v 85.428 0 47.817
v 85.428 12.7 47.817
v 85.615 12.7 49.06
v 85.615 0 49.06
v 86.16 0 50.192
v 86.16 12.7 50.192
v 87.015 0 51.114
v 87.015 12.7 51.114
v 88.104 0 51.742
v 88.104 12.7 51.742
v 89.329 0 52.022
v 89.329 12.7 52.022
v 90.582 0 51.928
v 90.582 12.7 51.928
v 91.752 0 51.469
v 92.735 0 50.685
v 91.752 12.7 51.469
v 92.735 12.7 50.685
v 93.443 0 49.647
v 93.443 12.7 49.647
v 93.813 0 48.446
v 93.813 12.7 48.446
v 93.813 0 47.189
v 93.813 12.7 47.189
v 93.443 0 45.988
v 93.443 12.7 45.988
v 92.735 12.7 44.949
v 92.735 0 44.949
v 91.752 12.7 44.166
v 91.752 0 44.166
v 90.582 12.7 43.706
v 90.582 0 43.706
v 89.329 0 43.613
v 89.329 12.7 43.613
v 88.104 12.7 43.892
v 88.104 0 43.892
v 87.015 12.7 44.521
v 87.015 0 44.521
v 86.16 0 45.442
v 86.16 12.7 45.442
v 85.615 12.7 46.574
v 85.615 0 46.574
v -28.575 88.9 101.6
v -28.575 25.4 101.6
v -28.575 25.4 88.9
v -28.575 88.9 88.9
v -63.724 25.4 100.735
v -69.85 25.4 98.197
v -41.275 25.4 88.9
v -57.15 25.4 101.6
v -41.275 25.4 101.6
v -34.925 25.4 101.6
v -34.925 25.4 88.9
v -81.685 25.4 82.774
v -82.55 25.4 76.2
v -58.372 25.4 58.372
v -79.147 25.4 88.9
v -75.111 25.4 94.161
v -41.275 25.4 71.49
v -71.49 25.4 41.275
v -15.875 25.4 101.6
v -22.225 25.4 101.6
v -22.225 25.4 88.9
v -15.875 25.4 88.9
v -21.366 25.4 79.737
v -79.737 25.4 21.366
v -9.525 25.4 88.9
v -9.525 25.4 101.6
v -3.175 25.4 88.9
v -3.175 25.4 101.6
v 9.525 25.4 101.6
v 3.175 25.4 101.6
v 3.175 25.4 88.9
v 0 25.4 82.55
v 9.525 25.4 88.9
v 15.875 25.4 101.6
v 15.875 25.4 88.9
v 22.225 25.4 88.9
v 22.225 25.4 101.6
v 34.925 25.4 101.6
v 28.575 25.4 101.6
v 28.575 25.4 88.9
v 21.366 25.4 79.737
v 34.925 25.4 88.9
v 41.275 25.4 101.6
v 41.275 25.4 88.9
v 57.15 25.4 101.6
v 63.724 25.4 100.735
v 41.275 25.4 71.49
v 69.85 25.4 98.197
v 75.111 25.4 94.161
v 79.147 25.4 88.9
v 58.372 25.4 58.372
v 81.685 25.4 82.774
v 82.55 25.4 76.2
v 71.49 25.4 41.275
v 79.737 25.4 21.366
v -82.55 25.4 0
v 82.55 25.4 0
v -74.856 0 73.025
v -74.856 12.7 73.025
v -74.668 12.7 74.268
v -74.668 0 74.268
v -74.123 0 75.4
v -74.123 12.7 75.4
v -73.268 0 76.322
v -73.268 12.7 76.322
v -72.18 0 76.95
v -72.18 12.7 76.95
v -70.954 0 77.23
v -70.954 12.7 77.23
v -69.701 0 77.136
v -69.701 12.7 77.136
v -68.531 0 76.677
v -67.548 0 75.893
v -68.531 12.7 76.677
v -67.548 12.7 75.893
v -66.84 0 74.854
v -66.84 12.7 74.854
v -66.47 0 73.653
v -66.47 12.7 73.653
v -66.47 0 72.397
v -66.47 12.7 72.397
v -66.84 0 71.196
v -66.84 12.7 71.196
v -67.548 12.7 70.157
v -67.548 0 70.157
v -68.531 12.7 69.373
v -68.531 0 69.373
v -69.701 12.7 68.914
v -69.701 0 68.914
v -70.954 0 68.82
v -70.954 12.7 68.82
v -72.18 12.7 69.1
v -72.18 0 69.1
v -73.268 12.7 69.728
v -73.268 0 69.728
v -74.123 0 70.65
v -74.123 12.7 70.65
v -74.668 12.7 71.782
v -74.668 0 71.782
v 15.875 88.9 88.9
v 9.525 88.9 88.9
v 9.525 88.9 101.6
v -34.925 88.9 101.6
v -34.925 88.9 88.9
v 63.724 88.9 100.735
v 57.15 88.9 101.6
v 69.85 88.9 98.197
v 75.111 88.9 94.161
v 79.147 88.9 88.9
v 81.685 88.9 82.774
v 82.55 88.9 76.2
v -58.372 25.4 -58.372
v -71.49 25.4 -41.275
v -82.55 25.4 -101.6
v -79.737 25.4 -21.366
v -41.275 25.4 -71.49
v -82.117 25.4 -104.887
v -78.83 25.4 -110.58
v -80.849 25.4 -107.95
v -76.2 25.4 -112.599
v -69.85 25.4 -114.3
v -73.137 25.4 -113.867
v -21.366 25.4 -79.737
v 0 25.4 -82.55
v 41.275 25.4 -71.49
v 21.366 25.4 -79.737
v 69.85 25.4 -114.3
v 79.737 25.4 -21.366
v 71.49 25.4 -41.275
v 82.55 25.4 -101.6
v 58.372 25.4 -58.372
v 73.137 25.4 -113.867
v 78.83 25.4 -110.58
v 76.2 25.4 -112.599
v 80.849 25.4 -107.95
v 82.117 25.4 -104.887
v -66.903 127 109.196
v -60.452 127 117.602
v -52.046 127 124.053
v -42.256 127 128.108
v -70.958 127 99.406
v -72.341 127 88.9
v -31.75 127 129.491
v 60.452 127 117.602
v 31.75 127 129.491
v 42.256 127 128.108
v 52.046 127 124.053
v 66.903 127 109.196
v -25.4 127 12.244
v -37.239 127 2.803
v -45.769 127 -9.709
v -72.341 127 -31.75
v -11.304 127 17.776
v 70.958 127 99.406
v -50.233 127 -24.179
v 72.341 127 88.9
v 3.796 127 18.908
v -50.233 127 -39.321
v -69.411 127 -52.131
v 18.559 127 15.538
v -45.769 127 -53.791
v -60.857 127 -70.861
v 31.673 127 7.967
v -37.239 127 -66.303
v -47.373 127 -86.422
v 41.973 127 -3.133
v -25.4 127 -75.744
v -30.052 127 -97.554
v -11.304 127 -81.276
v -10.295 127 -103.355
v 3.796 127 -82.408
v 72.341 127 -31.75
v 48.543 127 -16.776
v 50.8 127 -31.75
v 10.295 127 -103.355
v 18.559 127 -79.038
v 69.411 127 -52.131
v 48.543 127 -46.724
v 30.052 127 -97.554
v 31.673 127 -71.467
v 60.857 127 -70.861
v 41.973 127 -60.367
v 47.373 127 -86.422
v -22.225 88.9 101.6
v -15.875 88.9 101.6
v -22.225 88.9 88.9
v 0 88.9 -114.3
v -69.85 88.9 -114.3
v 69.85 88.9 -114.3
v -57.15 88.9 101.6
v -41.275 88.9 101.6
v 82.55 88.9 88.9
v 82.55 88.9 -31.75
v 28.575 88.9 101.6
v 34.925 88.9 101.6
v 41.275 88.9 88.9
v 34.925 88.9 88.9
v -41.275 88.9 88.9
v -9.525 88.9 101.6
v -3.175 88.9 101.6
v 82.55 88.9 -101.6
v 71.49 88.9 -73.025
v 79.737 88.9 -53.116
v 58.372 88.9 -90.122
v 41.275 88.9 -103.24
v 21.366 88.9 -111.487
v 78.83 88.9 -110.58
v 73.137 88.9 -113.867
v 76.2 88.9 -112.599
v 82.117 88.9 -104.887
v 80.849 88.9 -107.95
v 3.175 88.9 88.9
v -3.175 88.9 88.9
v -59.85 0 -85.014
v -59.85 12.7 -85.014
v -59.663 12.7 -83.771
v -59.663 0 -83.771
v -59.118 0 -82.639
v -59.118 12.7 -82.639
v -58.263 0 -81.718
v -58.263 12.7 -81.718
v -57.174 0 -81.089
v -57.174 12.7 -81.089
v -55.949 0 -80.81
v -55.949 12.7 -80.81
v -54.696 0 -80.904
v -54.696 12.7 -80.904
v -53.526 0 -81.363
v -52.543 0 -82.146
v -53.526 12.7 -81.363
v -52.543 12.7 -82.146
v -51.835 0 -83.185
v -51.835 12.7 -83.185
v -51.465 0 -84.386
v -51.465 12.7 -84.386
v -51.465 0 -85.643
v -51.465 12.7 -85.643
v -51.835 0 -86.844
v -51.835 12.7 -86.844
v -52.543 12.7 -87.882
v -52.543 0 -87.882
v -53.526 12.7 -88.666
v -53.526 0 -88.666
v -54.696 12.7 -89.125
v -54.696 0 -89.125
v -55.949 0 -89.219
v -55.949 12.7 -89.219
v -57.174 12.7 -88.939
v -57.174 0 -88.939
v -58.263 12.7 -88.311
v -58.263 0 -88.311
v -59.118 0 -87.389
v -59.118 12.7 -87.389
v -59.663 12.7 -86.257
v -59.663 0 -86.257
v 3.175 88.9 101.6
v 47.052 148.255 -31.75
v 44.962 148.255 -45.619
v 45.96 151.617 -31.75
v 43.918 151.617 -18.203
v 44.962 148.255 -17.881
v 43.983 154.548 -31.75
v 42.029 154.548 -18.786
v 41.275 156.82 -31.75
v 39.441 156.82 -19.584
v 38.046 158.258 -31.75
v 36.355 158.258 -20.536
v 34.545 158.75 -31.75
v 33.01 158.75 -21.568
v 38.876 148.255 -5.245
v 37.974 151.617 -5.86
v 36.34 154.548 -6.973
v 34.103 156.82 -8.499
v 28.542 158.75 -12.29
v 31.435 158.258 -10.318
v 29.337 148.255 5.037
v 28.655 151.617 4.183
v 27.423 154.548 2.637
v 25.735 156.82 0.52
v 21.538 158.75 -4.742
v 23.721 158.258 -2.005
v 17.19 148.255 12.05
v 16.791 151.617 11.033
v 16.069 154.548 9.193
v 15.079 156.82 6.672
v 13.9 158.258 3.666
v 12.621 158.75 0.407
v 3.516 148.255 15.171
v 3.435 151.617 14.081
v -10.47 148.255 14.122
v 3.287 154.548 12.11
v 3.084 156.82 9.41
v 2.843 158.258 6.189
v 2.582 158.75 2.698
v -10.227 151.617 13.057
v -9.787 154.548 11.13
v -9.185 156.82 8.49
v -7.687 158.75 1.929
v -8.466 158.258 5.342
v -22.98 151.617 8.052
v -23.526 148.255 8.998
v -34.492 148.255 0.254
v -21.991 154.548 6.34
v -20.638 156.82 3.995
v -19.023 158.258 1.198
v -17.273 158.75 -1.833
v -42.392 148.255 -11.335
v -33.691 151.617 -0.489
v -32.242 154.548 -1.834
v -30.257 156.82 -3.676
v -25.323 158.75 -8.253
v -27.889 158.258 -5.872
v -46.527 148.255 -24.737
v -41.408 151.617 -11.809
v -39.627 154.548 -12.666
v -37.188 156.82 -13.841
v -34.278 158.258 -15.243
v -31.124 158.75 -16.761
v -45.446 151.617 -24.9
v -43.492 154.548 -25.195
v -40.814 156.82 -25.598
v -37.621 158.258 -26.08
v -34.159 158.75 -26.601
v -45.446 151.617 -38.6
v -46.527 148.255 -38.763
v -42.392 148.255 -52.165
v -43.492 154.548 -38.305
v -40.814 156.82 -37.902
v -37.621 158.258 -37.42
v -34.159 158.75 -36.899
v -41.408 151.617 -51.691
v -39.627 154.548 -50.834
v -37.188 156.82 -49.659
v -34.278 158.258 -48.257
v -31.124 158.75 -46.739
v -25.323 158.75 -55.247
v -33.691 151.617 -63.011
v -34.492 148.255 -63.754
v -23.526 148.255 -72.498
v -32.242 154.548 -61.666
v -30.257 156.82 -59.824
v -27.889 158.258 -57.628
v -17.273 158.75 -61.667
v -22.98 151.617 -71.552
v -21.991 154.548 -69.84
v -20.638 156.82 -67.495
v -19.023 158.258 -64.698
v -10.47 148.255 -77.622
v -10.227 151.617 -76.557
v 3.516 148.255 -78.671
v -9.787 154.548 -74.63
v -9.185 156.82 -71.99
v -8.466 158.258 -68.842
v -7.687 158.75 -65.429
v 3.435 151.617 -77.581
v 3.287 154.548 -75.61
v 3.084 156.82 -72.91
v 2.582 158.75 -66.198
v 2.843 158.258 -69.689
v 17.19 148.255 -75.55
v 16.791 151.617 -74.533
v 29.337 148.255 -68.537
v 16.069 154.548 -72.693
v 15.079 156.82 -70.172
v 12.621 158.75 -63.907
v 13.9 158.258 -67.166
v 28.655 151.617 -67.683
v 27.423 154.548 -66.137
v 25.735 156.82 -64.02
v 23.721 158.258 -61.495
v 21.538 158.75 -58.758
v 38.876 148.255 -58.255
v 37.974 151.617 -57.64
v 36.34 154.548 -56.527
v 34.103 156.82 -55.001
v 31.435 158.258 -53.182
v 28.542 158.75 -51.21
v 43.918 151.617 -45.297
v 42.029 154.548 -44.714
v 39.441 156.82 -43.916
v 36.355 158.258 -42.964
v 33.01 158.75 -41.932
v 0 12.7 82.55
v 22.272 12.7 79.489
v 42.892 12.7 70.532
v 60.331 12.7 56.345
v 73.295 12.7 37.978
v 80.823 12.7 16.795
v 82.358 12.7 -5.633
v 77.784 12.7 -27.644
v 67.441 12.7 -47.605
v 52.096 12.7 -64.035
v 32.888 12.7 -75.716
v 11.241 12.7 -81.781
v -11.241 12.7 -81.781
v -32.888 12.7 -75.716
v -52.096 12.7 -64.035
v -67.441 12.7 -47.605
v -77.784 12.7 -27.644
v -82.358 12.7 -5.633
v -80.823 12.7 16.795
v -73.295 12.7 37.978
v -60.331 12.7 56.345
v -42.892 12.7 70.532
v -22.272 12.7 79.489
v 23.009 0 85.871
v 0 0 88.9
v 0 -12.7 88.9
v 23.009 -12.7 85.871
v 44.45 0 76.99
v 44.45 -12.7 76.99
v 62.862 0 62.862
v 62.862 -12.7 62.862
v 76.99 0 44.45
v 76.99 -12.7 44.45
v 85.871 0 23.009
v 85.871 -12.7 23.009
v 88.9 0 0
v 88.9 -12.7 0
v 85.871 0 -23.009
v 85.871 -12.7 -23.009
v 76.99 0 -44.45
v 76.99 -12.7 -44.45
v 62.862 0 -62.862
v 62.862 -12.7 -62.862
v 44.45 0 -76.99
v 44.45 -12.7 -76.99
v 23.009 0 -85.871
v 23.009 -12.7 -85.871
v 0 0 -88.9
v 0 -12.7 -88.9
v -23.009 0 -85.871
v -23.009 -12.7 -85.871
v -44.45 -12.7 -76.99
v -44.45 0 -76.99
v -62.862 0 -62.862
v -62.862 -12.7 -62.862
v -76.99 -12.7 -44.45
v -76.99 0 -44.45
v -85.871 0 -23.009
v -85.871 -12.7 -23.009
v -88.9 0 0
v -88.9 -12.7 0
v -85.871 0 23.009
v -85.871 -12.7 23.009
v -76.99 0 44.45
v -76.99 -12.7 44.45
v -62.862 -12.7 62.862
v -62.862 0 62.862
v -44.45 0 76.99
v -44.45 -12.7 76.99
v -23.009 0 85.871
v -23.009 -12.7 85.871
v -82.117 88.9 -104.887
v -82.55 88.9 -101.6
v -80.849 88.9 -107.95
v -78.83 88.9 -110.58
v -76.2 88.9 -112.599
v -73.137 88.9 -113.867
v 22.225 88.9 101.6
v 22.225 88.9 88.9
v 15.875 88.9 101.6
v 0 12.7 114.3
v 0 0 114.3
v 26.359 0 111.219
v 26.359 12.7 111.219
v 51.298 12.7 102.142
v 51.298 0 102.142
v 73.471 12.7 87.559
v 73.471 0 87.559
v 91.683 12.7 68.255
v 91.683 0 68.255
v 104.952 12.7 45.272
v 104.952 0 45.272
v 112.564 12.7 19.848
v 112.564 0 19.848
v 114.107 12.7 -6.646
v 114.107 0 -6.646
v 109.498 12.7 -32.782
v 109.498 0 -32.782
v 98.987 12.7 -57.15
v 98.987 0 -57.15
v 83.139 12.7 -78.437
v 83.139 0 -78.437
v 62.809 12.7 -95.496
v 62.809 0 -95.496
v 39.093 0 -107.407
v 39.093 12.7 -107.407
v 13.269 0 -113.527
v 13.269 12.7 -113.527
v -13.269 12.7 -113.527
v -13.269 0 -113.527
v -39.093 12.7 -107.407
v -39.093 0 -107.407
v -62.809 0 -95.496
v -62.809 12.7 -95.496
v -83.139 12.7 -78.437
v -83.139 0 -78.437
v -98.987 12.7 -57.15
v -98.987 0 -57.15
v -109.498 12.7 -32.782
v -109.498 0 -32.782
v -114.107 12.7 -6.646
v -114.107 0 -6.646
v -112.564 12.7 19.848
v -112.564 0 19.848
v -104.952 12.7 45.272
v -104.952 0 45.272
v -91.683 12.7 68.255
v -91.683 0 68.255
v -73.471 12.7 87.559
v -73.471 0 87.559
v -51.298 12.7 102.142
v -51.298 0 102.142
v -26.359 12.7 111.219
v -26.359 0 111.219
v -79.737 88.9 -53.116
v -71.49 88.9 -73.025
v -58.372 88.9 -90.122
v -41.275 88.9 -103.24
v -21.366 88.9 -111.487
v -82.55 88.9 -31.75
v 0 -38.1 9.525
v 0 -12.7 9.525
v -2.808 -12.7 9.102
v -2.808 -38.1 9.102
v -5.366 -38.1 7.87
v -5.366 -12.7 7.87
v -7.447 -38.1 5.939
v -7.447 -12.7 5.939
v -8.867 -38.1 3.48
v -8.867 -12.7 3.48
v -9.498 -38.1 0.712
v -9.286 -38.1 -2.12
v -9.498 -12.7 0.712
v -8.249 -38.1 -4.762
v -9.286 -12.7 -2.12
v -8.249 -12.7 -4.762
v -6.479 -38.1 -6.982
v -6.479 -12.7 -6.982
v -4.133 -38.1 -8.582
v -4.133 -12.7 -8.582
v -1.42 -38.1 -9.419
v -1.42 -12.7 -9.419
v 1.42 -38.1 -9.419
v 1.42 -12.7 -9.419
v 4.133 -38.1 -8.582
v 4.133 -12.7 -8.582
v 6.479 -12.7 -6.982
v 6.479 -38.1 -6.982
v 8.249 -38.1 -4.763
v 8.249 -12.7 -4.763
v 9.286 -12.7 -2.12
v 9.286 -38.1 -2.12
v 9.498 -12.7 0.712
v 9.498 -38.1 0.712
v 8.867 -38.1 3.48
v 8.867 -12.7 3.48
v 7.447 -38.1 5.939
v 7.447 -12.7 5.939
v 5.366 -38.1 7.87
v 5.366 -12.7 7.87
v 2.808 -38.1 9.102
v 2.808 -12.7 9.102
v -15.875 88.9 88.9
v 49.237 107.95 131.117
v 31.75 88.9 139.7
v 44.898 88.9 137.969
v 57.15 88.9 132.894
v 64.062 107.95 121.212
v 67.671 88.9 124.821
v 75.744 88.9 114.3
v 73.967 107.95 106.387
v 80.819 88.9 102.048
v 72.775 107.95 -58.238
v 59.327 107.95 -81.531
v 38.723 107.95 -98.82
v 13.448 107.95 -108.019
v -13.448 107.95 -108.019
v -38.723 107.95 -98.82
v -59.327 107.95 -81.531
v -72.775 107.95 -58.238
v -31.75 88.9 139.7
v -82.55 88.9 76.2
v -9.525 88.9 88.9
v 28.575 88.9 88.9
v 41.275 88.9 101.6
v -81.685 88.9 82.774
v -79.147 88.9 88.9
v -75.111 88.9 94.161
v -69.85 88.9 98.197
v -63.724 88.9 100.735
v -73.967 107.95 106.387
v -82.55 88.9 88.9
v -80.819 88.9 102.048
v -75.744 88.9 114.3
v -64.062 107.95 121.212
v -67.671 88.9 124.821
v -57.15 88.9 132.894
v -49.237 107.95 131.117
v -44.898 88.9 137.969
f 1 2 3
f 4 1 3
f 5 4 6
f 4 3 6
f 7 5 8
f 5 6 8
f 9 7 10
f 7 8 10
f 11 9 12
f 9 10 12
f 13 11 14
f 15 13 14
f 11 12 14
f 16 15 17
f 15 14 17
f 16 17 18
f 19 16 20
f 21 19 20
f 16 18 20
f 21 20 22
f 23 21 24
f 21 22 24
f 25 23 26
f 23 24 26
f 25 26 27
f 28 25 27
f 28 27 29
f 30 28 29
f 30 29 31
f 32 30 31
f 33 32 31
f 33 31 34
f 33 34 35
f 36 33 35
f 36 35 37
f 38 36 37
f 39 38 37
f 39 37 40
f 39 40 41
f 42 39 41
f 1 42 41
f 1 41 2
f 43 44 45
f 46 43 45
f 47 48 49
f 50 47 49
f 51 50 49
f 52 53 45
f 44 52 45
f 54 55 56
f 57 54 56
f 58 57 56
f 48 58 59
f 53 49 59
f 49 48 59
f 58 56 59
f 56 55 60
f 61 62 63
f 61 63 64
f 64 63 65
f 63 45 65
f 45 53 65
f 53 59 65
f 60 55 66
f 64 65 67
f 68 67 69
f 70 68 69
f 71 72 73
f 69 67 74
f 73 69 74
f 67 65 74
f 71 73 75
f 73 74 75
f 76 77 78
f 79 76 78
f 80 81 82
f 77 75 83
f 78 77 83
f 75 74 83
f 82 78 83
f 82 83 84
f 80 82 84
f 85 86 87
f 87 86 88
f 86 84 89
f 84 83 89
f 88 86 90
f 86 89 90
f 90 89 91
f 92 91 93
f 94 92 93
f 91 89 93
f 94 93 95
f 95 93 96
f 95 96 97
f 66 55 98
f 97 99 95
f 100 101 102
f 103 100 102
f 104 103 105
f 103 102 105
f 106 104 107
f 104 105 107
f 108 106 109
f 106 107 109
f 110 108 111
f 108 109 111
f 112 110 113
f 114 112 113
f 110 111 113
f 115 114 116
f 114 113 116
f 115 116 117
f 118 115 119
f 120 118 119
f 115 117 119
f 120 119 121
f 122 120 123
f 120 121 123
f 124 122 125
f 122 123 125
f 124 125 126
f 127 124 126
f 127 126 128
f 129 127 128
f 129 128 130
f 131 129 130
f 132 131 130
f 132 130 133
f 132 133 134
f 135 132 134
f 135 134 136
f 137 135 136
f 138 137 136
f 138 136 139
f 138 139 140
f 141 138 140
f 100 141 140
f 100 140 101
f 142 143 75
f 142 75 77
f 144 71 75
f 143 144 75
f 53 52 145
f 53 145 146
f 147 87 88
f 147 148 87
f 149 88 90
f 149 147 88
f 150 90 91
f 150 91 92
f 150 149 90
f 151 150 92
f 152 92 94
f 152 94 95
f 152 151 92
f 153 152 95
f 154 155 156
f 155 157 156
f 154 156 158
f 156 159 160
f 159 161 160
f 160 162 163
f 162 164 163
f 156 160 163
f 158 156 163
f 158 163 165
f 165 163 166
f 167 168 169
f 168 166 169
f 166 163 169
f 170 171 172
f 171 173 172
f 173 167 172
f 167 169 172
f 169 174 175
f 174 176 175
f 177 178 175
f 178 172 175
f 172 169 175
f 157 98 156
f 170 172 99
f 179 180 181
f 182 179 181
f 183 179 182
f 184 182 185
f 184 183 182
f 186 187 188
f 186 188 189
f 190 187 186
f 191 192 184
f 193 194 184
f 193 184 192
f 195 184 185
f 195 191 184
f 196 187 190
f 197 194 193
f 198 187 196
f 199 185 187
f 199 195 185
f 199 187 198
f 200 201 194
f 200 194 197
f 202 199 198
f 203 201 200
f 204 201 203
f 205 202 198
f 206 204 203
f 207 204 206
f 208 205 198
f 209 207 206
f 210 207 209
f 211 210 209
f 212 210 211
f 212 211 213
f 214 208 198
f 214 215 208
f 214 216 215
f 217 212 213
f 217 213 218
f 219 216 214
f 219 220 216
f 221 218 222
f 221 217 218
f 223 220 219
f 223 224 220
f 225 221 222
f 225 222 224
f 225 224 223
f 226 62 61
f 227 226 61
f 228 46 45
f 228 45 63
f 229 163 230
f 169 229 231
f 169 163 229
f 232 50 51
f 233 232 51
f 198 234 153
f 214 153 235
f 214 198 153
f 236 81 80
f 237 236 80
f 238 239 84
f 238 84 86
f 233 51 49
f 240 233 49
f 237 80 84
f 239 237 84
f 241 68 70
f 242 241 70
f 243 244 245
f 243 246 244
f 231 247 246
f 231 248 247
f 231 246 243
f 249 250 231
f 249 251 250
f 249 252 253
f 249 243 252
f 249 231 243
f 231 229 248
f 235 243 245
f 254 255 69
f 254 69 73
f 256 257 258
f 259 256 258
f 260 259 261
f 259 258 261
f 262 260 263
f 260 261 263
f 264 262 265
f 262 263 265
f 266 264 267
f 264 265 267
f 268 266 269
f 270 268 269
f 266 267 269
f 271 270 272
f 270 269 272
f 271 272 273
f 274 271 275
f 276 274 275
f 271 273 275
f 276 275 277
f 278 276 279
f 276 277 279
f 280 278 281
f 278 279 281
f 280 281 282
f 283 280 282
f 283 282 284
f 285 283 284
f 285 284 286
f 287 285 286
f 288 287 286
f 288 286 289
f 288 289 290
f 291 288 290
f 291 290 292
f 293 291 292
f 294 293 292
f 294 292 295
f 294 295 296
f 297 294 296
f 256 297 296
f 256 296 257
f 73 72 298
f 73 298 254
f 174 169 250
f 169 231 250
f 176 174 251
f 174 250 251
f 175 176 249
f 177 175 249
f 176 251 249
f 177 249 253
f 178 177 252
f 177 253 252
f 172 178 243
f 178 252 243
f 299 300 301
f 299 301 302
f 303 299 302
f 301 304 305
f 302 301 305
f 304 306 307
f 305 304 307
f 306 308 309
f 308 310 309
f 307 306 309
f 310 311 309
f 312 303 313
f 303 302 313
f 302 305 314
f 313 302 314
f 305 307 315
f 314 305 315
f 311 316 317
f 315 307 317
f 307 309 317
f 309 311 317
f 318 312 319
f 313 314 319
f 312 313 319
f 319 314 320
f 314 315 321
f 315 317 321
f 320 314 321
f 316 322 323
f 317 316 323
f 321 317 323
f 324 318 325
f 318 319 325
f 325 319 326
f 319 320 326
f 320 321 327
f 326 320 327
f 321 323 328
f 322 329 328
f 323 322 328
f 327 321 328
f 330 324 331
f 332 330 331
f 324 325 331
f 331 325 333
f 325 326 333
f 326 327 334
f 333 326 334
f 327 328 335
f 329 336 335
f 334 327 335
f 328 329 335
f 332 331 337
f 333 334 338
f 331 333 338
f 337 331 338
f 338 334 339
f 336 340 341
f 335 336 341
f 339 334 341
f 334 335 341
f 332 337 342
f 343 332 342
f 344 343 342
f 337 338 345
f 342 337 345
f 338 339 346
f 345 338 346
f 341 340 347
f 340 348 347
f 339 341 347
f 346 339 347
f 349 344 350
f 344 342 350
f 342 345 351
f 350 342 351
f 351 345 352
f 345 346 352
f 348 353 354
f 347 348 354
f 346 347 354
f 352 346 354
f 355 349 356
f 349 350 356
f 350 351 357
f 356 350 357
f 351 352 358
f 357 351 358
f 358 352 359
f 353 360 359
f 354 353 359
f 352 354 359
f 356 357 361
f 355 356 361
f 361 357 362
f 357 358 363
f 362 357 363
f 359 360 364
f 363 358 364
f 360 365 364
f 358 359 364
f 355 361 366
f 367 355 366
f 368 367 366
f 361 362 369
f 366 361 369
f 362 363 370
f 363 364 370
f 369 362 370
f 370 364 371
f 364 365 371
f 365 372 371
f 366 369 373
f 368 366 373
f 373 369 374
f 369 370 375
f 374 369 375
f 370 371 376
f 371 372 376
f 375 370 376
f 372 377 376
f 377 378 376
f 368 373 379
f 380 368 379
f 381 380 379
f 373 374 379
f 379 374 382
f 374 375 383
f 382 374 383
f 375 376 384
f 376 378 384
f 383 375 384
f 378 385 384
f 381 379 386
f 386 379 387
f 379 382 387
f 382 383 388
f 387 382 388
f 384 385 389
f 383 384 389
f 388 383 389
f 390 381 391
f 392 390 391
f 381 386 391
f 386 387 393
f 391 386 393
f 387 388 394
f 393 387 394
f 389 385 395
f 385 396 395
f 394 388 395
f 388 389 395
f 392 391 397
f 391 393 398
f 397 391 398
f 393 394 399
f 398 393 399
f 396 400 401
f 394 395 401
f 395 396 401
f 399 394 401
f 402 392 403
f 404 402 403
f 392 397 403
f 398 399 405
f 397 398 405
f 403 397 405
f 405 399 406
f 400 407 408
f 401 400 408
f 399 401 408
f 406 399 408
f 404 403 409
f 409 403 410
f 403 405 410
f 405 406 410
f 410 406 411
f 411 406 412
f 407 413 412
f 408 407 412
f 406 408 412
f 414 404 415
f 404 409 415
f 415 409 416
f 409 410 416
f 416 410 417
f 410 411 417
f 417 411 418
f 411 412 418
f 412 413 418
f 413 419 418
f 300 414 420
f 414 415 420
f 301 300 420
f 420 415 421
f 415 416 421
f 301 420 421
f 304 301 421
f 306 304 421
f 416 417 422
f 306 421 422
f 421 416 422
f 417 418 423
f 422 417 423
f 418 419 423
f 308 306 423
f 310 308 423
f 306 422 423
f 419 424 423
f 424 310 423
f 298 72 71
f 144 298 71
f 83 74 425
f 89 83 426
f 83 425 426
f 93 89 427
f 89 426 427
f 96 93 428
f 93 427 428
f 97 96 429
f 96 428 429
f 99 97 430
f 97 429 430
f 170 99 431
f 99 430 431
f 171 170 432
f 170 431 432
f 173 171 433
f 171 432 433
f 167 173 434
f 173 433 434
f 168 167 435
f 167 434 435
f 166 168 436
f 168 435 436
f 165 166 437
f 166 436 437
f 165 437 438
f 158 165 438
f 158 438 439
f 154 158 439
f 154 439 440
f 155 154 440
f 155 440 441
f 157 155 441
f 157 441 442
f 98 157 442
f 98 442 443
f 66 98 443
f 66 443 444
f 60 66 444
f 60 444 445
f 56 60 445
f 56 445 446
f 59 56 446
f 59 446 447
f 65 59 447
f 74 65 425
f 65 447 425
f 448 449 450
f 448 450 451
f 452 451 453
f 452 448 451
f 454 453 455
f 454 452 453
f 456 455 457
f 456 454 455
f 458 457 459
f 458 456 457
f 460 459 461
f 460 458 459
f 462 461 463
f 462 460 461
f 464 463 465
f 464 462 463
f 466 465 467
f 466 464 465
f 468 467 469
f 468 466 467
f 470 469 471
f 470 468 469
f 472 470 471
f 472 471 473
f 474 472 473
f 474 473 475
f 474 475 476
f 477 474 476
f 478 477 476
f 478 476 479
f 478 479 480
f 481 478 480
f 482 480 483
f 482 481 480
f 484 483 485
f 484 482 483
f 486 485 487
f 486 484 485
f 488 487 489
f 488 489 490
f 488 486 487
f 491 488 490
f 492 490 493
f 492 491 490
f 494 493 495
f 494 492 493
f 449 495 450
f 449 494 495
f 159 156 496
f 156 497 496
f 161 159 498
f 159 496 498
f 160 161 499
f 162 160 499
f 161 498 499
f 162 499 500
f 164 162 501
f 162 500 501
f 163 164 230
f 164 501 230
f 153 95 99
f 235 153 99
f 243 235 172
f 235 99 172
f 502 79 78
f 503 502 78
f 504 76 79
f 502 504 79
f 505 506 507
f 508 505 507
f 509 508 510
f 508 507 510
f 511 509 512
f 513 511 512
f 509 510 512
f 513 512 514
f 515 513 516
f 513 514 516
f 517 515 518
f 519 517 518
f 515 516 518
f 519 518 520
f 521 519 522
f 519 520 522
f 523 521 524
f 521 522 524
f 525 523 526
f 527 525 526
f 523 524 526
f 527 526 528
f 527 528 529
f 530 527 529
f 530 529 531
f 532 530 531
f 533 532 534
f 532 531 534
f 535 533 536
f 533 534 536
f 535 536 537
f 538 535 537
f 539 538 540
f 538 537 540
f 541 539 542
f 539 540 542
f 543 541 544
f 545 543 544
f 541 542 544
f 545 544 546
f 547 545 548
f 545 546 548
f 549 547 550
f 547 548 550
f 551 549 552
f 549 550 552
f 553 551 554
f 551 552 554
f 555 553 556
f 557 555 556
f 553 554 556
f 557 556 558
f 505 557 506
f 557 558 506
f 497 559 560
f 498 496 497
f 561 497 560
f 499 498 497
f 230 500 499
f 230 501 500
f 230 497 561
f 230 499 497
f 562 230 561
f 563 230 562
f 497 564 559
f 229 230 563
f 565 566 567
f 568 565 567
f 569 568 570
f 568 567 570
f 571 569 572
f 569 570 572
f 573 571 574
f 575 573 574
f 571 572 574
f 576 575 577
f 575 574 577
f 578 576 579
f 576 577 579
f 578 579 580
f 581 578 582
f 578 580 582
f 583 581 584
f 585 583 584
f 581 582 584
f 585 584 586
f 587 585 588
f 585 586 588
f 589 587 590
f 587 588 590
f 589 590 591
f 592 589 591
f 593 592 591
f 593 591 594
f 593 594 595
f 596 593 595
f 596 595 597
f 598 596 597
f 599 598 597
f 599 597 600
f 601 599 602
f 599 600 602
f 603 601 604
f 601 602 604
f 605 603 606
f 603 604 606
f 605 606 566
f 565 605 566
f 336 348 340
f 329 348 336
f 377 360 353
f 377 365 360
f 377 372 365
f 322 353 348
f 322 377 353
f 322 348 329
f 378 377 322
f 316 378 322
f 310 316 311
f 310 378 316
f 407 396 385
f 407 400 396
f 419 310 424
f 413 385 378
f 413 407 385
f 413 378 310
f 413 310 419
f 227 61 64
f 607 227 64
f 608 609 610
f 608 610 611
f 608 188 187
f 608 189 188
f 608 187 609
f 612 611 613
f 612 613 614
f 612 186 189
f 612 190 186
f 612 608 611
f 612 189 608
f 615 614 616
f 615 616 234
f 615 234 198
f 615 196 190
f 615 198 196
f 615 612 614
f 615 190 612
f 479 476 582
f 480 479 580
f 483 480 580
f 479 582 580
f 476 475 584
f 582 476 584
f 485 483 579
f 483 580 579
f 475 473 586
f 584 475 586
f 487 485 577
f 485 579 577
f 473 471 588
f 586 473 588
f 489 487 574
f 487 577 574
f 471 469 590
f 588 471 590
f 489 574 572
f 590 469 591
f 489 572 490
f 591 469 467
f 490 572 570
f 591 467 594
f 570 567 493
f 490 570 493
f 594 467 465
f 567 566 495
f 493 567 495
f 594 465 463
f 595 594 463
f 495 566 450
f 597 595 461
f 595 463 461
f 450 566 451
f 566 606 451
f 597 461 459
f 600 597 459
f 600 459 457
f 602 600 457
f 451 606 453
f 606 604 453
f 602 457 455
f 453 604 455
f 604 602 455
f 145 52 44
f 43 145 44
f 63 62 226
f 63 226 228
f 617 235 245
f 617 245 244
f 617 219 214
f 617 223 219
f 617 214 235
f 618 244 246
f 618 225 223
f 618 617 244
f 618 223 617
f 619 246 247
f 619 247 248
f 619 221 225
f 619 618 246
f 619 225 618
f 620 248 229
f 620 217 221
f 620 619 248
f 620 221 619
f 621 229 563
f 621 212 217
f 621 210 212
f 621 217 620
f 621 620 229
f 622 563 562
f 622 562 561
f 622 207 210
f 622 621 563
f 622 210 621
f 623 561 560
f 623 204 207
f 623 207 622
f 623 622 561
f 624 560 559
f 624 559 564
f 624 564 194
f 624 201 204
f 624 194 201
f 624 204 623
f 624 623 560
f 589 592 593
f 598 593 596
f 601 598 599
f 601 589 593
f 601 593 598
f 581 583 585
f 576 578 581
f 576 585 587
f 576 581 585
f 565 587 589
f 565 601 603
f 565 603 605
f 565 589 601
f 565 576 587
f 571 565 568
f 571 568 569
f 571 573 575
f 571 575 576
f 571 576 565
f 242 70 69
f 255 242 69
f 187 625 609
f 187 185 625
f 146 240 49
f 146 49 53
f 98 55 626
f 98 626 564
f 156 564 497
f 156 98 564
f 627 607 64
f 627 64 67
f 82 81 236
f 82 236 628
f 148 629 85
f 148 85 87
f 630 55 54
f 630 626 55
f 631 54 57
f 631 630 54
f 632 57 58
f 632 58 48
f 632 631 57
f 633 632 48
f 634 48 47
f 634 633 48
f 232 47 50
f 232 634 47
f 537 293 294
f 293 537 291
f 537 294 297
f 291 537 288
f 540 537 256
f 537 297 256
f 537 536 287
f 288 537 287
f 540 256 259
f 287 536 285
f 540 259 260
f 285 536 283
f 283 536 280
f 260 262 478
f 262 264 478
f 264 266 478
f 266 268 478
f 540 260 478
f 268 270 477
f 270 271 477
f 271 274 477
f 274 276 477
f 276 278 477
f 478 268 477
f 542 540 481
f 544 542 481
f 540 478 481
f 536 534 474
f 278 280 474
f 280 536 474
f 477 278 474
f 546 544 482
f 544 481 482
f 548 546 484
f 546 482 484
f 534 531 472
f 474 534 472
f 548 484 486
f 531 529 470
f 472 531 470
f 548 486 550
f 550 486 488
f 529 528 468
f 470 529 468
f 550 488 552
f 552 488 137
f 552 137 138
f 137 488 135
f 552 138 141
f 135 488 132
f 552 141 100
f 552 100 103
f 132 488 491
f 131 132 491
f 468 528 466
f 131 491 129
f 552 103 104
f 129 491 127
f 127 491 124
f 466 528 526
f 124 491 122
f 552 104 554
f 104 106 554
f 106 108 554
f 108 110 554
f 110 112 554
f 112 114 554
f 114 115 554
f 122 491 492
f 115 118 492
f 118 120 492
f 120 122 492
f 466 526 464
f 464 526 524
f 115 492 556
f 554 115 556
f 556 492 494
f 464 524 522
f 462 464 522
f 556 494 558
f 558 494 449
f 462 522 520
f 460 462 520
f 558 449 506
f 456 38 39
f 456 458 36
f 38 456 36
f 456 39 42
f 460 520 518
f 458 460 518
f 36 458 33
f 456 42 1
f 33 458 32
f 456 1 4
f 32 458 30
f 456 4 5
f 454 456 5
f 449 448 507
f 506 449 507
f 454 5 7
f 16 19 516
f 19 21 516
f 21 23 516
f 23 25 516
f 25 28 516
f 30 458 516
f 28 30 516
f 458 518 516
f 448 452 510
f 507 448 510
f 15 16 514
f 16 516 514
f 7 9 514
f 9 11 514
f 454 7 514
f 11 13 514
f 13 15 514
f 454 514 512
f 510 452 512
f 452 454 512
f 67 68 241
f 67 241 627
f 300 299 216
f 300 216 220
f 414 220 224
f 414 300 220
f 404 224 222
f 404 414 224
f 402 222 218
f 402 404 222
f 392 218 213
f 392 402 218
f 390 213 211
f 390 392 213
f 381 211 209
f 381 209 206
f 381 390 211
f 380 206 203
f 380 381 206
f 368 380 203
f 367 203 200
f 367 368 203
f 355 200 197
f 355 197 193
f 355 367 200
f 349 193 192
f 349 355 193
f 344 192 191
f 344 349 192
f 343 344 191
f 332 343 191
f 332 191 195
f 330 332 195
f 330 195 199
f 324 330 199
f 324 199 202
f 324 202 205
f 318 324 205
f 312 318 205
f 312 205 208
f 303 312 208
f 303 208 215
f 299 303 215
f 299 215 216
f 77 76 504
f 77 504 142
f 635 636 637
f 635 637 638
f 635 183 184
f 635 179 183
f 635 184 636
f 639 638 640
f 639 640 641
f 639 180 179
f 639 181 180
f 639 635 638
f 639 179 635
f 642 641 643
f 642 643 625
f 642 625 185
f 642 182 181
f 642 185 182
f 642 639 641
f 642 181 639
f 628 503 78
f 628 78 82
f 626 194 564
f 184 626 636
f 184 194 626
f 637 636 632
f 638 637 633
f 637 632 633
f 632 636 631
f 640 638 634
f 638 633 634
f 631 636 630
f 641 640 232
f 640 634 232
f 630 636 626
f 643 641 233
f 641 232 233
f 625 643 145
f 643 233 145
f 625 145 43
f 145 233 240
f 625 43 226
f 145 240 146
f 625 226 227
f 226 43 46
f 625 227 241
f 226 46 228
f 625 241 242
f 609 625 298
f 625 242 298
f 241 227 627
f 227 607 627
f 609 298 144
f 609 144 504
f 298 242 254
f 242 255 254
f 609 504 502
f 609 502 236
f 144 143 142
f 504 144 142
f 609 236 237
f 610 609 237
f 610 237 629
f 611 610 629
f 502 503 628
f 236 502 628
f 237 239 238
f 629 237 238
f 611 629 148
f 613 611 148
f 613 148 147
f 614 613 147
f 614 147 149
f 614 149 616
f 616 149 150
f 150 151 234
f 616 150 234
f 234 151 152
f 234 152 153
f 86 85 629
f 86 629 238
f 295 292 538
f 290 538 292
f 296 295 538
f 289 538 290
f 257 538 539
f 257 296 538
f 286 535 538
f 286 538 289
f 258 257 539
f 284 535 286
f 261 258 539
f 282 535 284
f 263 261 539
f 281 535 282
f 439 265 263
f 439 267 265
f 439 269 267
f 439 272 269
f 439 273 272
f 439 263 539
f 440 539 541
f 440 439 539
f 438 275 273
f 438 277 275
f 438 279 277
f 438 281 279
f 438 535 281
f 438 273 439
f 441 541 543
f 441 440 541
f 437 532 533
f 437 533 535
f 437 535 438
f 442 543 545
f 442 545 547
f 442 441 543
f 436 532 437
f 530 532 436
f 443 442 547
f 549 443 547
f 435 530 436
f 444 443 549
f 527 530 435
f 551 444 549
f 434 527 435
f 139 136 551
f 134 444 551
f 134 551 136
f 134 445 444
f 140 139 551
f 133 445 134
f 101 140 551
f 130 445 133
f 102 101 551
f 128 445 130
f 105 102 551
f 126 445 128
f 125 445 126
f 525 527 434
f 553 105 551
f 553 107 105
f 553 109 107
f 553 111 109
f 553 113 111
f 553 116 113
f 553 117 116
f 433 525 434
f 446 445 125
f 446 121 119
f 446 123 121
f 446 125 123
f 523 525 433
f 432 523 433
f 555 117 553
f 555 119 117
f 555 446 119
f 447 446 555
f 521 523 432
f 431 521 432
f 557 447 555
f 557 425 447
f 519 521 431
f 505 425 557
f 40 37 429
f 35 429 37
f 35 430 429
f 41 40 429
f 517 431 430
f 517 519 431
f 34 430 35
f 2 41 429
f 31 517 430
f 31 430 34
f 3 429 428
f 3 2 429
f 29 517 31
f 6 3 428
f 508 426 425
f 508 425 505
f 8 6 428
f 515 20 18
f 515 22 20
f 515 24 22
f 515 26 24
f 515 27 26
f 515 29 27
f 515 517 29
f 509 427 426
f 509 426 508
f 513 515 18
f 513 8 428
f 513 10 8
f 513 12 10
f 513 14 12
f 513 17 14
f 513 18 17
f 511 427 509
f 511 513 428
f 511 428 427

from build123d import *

# Parameters (mm, degrees)
SKETCH1_R                   = 88.9
BASE_DEPTH                  = 12.7
SKETCH1_4_R                 = 114.3
SKETCH1_4_R_2               = 88.9
BOLT_BELT_DEPTH             = 12.7
F_3_8_24_TAPPED_HOLE1_D     = 8.4328
SKETCH21_R                  = 82.55
ENGINE_OFFSET_DEPTH         = 12.7
SKETCH20_W                  = 165.1
SKETCH20_H                  = 215.9
ENGINE_BLOCK_DEPTH          = 63.5
ENGINE_BLOCK_FILLET_FRONT_R = 25.4
ENGINE_BLOCK_FILLET_BACK_R  = 12.7
SKETCH22_W                  = 6.35
SKETCH22_H                  = 25.4
FINS_DEPTH                  = 63.5
FIN_LPATTERN1_COUNT         = 4
FIN_LPATTERN1_PITCH         = 12.7
FIN_LPATTERN1_COL_COUNT     = 4
FIN_LPATTERN1_COL_PITCH     = 12.7
SHROUD_DEPTH                = 38.1
SHROUD_TAPER                = 15
SKETCH24_R                  = 50.8
CORD_HOUSING_DEPTH          = 31.75
CORD_HOUSING_TAPER          = 10
CORD_HOUSING_FILLET_R       = 12.7
SKETCH25_R                  = 9.525
BOSS_EXTRUDE7_DEPTH         = 25.4


with BuildPart() as part:
    # Sketch1 → Base (new body)
    with BuildSketch(Plane(origin=(0, 0, 0), x_dir=(1, 0, 0), z_dir=(0, 1, 0))):
        with Locations(Location((0, 0, 0), (0, 0, 270))):  # turned: the seam where the file's is
            Circle(SKETCH1_R)
    extrude(amount=-BASE_DEPTH)

    # Sketch1_4 → Bolt Belt (add)
    with BuildSketch(Plane(origin=(0, 0, 0), x_dir=(1, 0, 0), z_dir=(0, 1, 0))):
        with Locations(Location((0, 0, 0), (0, 0, 270))):  # turned: the seam where the file's is
            Circle(SKETCH1_4_R)
        with Locations(Location((0, 0, 0), (0, 0, 270))):  # turned: the seam where the file's is
            Circle(SKETCH1_4_R_2, mode=Mode.SUBTRACT)
        with Locations(Location((0, 0, 0), (0, 0, 270))):  # turned: the seam where the file's is
            Circle(SKETCH1_4_R_2)
    extrude(amount=BOLT_BELT_DEPTH)

    # 3_8-24 Tapped Hole1 (through all)
    with Locations(Plane.XZ):
        with Locations((-70.63929059, 73.025), (89.644179842, 47.817162405), (-55.633966752, -85.014244356)):
            Hole(F_3_8_24_TAPPED_HOLE1_D / 2)

    # Sketch21 → Engine Offset (add)
    with BuildSketch(Plane(origin=(0, 12.7, 0), x_dir=(1, 0, 0), z_dir=(0, 1, 0))):
        with Locations(Location((0, 0, 0), (0, 0, 270))):  # turned: the seam where the file's is
            Circle(SKETCH21_R)
    extrude(amount=ENGINE_OFFSET_DEPTH)

    # Sketch20 → Engine Block (add)
    with BuildSketch(Plane(origin=(0, 25.4, 0), x_dir=(1, 0, 0), z_dir=(0, 1, 0))):
        with Locations((0, 6.35)):
            Rectangle(SKETCH20_W, SKETCH20_H)
    extrude(amount=ENGINE_BLOCK_DEPTH)

    # Engine Block Fillet Front
    engine_block_fillet_front_edges = [part.edges().sort_by_distance(p)[0] for p in [
        (-82.55, 57.15, 101.6),
        (82.55, 57.15, 101.6),
    ]]
    fillet(engine_block_fillet_front_edges, radius=ENGINE_BLOCK_FILLET_FRONT_R)

    # Engine Block Fillet Back
    engine_block_fillet_back_edges = [part.edges().sort_by_distance(p)[0] for p in [
        (-82.55, 57.15, -114.3),
        (82.55, 57.15, -114.3),
    ]]
    fillet(engine_block_fillet_back_edges, radius=ENGINE_BLOCK_FILLET_BACK_R)

    # Sketch22 → Fins (cut)
    with BuildSketch(Plane(origin=(0, 88.9, 0), x_dir=(1, 0, 0), z_dir=(0, 1, 0))):
        with Locations((0, -101.6)):
            Rectangle(SKETCH22_W, SKETCH22_H)
    fins = extrude(amount=-FINS_DEPTH, mode=Mode.SUBTRACT)

    # Fin LPattern1: Fins ×4
    with Locations(*[(i * FIN_LPATTERN1_PITCH, 0, 0) for i in range(1, FIN_LPATTERN1_COUNT)]):
        add(fins, mode=Mode.SUBTRACT)

    # Fin LPattern1 col: Fins ×4
    with Locations(*[(-i * FIN_LPATTERN1_COL_PITCH, 0, 0) for i in range(1, FIN_LPATTERN1_COL_COUNT)]):
        add(fins, mode=Mode.SUBTRACT)

    # Sketch23 → Shroud (add)
    with BuildSketch(Plane(origin=(0, 88.9, 0), x_dir=(1, 0, 0), z_dir=(0, 1, 0))):
        with BuildLine():
            ThreePointArc((82.55, 31.75), (0, 114.3), (-82.55, 31.75))
            Line((-82.55, 31.75), (-82.55, -88.9))
            ThreePointArc((-82.55, -88.9), (-67.671024484, -124.821024484), (-31.75, -139.7))
            Line((-31.75, -139.7), (31.75, -139.7))
            ThreePointArc((31.75, -139.7), (67.671024484, -124.821024484), (82.55, -88.9))
            Line((82.55, -88.9), (82.55, 31.75))
        make_face()
    extrude(amount=SHROUD_DEPTH, taper=SHROUD_TAPER)

    # Sketch24 → Cord Housing (add)
    with BuildSketch(Plane(origin=(0, 127, 0), x_dir=(1, 0, 0), z_dir=(0, 1, 0))):
        with Locations((0, 31.75)):
            Circle(SKETCH24_R)
    extrude(amount=CORD_HOUSING_DEPTH, taper=CORD_HOUSING_TAPER)

    # Cord Housing Fillet
    cord_housing_fillet_edges = [part.edges().sort_by_distance(p)[0] for p in [
        (-45.201618363, 158.75, -31.75),
    ]]
    fillet(cord_housing_fillet_edges, radius=CORD_HOUSING_FILLET_R)

    # Sketch25 → Boss-Extrude7 (add)
    with BuildSketch(Plane.XZ.offset(12.7)):
        with Locations(Location((0, 0, 0), (0, 0, 90))):  # turned: the seam where the file's is
            Circle(SKETCH25_R)
    extrude(amount=BOSS_EXTRUDE7_DEPTH)


solid = part.part
